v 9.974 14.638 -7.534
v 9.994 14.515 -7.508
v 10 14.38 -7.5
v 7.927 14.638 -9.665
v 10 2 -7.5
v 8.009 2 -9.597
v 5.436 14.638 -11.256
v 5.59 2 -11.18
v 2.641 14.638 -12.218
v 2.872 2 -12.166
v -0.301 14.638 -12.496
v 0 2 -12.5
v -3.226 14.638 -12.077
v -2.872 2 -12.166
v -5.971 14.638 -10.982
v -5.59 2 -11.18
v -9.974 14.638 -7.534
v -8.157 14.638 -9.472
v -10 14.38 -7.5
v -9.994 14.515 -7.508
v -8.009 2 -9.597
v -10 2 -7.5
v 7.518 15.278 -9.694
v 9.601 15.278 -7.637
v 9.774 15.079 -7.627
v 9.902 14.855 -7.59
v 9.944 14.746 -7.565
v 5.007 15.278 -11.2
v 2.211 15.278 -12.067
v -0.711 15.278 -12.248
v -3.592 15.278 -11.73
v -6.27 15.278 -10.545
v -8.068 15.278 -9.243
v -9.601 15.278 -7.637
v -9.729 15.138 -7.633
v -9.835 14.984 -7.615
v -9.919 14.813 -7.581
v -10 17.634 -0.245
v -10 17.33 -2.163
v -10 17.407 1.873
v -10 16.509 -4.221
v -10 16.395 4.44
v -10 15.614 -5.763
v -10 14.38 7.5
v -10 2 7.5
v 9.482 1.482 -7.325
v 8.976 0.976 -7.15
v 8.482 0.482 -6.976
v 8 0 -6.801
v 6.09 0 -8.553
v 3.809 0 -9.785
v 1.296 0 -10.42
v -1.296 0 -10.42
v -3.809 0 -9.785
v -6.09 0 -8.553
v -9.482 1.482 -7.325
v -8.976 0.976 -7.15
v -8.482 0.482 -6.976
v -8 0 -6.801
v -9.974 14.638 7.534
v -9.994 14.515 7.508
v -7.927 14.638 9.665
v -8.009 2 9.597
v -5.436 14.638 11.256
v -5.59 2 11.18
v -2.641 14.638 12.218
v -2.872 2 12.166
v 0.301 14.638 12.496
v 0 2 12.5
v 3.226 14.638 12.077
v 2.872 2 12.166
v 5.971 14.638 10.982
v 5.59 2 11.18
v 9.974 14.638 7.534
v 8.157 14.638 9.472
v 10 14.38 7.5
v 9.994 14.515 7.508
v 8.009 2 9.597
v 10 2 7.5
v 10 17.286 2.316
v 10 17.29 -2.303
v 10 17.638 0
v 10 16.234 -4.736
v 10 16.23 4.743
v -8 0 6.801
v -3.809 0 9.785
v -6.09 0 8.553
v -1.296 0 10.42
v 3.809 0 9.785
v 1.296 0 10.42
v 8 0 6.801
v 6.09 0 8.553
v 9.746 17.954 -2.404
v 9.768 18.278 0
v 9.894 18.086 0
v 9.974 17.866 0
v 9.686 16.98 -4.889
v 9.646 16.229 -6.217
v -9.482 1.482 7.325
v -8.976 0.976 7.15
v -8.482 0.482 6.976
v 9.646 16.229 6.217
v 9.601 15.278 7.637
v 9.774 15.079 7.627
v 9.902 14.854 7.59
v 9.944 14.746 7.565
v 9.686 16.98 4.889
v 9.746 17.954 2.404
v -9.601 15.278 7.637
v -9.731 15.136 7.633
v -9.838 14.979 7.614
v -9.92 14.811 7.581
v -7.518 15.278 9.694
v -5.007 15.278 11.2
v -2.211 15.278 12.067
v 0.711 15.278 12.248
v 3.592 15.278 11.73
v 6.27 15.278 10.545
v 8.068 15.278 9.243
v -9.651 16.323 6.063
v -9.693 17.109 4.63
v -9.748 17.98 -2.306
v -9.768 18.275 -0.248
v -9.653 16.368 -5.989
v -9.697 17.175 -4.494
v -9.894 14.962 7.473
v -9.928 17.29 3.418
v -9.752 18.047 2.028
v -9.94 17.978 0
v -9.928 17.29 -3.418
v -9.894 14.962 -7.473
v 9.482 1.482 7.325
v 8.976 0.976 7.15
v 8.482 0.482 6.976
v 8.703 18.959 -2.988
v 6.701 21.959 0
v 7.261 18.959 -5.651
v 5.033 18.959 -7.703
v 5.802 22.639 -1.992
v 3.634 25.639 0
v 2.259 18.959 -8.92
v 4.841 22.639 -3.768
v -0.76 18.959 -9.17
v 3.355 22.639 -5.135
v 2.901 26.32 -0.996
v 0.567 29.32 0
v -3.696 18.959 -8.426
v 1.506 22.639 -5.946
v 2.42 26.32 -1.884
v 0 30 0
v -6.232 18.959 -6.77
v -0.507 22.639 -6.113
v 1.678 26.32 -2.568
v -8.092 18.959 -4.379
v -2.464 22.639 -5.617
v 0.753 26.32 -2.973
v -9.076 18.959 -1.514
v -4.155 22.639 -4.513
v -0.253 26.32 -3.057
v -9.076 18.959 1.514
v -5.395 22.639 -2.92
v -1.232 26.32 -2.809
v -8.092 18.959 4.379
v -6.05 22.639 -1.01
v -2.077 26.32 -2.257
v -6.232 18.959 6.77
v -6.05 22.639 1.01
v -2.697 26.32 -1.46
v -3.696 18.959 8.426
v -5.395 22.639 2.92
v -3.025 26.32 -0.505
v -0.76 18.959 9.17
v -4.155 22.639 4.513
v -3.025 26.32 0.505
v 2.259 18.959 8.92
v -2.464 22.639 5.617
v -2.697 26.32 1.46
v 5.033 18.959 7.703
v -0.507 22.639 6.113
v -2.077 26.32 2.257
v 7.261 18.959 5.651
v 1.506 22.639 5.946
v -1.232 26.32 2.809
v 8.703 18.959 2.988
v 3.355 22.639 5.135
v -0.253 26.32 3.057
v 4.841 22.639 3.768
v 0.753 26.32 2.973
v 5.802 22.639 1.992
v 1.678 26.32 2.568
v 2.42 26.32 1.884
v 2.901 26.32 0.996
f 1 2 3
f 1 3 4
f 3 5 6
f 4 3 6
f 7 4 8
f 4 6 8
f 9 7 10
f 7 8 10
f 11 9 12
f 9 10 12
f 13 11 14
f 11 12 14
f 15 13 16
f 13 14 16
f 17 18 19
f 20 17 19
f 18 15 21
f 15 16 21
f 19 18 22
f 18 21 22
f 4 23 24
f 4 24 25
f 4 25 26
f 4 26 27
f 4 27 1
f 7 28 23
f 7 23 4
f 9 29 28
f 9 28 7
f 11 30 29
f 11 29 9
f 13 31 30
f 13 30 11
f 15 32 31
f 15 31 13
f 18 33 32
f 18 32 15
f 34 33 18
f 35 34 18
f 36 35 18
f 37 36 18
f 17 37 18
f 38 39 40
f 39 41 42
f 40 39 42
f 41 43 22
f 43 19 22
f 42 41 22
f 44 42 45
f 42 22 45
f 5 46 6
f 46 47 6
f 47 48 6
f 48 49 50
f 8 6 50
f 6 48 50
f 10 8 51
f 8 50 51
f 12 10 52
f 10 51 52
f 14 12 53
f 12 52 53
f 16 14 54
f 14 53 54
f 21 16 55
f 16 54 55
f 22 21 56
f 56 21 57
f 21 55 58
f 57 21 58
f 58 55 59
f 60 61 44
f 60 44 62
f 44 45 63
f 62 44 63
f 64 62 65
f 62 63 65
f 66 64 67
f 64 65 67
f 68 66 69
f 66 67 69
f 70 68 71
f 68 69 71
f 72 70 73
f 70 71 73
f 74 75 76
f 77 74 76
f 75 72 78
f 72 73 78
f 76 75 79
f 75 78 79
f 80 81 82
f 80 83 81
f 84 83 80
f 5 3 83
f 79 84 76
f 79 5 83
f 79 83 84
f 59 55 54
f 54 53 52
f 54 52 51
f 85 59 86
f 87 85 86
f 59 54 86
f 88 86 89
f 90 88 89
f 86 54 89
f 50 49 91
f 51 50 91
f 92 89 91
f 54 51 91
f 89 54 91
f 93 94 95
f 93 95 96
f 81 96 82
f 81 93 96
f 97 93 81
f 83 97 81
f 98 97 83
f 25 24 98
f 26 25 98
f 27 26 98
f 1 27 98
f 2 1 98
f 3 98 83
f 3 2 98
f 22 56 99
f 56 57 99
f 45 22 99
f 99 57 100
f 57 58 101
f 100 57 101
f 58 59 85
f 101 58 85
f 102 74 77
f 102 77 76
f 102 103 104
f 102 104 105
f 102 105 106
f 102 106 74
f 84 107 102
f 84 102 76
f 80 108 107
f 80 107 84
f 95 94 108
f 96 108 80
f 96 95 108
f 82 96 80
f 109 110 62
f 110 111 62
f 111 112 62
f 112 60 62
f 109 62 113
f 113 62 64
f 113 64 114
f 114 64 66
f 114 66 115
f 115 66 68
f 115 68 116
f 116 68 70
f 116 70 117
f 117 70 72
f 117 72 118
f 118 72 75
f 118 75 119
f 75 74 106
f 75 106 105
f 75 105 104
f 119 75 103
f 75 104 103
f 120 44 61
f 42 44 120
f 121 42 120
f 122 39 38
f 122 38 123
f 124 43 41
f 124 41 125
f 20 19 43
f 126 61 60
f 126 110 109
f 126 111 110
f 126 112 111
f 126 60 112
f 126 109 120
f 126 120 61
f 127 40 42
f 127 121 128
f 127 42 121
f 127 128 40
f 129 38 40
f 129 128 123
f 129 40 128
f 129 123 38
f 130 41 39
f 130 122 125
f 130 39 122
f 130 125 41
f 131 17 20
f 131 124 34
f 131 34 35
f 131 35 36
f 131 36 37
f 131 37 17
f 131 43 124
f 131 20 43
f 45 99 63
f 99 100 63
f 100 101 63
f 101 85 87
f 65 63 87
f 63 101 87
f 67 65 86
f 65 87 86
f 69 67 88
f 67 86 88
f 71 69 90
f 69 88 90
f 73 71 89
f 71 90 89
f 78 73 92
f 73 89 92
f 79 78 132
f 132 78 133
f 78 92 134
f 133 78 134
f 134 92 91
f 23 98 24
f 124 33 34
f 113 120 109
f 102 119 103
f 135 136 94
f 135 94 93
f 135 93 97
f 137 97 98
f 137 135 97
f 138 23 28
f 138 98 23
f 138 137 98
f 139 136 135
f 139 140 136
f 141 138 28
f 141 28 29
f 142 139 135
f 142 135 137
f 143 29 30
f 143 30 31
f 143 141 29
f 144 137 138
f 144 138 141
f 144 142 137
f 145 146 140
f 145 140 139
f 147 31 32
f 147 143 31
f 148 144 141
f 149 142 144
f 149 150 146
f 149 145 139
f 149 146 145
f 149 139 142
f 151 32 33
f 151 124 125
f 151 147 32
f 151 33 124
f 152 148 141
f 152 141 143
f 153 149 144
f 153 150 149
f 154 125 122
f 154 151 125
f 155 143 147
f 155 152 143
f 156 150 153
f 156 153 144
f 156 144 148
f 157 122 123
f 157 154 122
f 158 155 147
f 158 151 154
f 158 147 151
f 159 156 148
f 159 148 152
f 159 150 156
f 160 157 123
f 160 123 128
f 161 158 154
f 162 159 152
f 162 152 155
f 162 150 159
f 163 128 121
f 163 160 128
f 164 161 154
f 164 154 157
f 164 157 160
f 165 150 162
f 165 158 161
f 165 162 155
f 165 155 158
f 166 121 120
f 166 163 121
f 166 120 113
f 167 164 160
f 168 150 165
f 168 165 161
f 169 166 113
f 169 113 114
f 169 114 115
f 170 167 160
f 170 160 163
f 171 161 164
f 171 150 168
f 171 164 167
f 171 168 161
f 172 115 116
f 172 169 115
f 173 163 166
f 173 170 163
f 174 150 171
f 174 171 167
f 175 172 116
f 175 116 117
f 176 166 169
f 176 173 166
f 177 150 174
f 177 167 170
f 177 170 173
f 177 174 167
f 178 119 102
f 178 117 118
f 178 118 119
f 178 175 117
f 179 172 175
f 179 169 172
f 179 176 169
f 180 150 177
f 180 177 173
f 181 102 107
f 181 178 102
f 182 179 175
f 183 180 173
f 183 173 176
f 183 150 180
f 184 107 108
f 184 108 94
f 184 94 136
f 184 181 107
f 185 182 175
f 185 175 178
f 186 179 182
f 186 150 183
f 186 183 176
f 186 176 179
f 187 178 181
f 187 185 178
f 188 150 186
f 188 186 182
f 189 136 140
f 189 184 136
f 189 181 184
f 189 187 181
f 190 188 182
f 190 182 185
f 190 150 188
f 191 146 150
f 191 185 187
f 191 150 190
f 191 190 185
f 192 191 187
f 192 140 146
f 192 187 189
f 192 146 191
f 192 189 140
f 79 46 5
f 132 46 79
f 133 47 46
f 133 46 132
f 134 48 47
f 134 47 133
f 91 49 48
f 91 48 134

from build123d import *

# Parameters (mm, degrees)
SKETCH1_R           = 12.5
BOSS_EXTRUDE2_DEPTH = 15
CUT_EXTRUDE1_REACH  = 36.821
CHAMFER1_SIZE       = 2
FILLET1_R           = 1


with BuildPart() as part:
    # Sketch1 → Boss-Extrude2 (new body)
    with BuildSketch(Plane(origin=(0, 0, 0), x_dir=(1, 0, 0), z_dir=(0, 1, 0))):
        with Locations(Location((0, 0, 0), (0, 0, 270))):
            Circle(SKETCH1_R)
    extrude(amount=BOSS_EXTRUDE2_DEPTH)

    # Sketch2 → Revolve1 (revolve)
    with BuildSketch(Plane.XY):
        Polygon((12.5, 15), (0, 30), (0, 15), align=None)
    revolve(axis=Axis((0, -1000, 0), (0, 1, 0)))

    # Cut-Extrude1: up to this cone (the profile starts inside it)
    cut_extrude1_end = Plane(origin=(0, 0, 0), z_dir=(0, -1, 0)).offset(-29.999999) * Cone(1e-06, 76.934166667, 92.320999, align=(Align.CENTER, Align.CENTER, Align.MIN), mode=Mode.PRIVATE)
    # Sketch3 → Cut-Extrude1 (cut, up to the surface)
    with BuildSketch(Plane(origin=(0, 0, 0), x_dir=(1, 0, 0), z_dir=(0, 1, 0)), mode=Mode.PRIVATE) as cut_extrude1_sk1:
        with BuildLine():
            Line((-10, 7.5), (-10, -7.5))
            ThreePointArc((-10, -7.5), (-12.5, 0), (-10, 7.5))
        make_face()
    cut_extrude1_tool1 = extrude(cut_extrude1_sk1.sketch, amount=CUT_EXTRUDE1_REACH, mode=Mode.PRIVATE) & cut_extrude1_end
    add(cut_extrude1_tool1.solids().sort_by_distance((-11.0091, 0, 0))[0], mode=Mode.SUBTRACT)
    # Sketch3 → Cut-Extrude1 (cut, up to the surface)
    with BuildSketch(Plane(origin=(0, 0, 0), x_dir=(1, 0, 0), z_dir=(0, 1, 0)), mode=Mode.PRIVATE) as cut_extrude1_sk2:
        with BuildLine():
            Line((10, 7.5), (10, -7.5))
            ThreePointArc((10, -7.5), (12.5, 0), (10, 7.5))
        make_face()
    cut_extrude1_tool2 = extrude(cut_extrude1_sk2.sketch, amount=CUT_EXTRUDE1_REACH, mode=Mode.PRIVATE) & cut_extrude1_end
    add(cut_extrude1_tool2.solids().sort_by_distance((11.0091, 0, 0))[0], mode=Mode.SUBTRACT)

    # Chamfer1
    chamfer1_edges = [part.edges().sort_by_distance(p)[0] for p in [
        (0, 0, -12.5),
        (0, 0, 12.5),
        (-10, 0, 0),
        (10, 0, 0),
    ]]
    chamfer(chamfer1_edges, length=CHAMFER1_SIZE)

    # Fillet1
    fillet1_edges = [part.edges().sort_by_distance(p)[0] for p in [
        (-10, 17.087815774, 3.972518962),
        (10, 17.087815774, -3.972518962),
        (0, 15, -12.5),
        (0, 15, 12.5),
    ]]
    fillet(fillet1_edges, radius=FILLET1_R)


solid = part.part
